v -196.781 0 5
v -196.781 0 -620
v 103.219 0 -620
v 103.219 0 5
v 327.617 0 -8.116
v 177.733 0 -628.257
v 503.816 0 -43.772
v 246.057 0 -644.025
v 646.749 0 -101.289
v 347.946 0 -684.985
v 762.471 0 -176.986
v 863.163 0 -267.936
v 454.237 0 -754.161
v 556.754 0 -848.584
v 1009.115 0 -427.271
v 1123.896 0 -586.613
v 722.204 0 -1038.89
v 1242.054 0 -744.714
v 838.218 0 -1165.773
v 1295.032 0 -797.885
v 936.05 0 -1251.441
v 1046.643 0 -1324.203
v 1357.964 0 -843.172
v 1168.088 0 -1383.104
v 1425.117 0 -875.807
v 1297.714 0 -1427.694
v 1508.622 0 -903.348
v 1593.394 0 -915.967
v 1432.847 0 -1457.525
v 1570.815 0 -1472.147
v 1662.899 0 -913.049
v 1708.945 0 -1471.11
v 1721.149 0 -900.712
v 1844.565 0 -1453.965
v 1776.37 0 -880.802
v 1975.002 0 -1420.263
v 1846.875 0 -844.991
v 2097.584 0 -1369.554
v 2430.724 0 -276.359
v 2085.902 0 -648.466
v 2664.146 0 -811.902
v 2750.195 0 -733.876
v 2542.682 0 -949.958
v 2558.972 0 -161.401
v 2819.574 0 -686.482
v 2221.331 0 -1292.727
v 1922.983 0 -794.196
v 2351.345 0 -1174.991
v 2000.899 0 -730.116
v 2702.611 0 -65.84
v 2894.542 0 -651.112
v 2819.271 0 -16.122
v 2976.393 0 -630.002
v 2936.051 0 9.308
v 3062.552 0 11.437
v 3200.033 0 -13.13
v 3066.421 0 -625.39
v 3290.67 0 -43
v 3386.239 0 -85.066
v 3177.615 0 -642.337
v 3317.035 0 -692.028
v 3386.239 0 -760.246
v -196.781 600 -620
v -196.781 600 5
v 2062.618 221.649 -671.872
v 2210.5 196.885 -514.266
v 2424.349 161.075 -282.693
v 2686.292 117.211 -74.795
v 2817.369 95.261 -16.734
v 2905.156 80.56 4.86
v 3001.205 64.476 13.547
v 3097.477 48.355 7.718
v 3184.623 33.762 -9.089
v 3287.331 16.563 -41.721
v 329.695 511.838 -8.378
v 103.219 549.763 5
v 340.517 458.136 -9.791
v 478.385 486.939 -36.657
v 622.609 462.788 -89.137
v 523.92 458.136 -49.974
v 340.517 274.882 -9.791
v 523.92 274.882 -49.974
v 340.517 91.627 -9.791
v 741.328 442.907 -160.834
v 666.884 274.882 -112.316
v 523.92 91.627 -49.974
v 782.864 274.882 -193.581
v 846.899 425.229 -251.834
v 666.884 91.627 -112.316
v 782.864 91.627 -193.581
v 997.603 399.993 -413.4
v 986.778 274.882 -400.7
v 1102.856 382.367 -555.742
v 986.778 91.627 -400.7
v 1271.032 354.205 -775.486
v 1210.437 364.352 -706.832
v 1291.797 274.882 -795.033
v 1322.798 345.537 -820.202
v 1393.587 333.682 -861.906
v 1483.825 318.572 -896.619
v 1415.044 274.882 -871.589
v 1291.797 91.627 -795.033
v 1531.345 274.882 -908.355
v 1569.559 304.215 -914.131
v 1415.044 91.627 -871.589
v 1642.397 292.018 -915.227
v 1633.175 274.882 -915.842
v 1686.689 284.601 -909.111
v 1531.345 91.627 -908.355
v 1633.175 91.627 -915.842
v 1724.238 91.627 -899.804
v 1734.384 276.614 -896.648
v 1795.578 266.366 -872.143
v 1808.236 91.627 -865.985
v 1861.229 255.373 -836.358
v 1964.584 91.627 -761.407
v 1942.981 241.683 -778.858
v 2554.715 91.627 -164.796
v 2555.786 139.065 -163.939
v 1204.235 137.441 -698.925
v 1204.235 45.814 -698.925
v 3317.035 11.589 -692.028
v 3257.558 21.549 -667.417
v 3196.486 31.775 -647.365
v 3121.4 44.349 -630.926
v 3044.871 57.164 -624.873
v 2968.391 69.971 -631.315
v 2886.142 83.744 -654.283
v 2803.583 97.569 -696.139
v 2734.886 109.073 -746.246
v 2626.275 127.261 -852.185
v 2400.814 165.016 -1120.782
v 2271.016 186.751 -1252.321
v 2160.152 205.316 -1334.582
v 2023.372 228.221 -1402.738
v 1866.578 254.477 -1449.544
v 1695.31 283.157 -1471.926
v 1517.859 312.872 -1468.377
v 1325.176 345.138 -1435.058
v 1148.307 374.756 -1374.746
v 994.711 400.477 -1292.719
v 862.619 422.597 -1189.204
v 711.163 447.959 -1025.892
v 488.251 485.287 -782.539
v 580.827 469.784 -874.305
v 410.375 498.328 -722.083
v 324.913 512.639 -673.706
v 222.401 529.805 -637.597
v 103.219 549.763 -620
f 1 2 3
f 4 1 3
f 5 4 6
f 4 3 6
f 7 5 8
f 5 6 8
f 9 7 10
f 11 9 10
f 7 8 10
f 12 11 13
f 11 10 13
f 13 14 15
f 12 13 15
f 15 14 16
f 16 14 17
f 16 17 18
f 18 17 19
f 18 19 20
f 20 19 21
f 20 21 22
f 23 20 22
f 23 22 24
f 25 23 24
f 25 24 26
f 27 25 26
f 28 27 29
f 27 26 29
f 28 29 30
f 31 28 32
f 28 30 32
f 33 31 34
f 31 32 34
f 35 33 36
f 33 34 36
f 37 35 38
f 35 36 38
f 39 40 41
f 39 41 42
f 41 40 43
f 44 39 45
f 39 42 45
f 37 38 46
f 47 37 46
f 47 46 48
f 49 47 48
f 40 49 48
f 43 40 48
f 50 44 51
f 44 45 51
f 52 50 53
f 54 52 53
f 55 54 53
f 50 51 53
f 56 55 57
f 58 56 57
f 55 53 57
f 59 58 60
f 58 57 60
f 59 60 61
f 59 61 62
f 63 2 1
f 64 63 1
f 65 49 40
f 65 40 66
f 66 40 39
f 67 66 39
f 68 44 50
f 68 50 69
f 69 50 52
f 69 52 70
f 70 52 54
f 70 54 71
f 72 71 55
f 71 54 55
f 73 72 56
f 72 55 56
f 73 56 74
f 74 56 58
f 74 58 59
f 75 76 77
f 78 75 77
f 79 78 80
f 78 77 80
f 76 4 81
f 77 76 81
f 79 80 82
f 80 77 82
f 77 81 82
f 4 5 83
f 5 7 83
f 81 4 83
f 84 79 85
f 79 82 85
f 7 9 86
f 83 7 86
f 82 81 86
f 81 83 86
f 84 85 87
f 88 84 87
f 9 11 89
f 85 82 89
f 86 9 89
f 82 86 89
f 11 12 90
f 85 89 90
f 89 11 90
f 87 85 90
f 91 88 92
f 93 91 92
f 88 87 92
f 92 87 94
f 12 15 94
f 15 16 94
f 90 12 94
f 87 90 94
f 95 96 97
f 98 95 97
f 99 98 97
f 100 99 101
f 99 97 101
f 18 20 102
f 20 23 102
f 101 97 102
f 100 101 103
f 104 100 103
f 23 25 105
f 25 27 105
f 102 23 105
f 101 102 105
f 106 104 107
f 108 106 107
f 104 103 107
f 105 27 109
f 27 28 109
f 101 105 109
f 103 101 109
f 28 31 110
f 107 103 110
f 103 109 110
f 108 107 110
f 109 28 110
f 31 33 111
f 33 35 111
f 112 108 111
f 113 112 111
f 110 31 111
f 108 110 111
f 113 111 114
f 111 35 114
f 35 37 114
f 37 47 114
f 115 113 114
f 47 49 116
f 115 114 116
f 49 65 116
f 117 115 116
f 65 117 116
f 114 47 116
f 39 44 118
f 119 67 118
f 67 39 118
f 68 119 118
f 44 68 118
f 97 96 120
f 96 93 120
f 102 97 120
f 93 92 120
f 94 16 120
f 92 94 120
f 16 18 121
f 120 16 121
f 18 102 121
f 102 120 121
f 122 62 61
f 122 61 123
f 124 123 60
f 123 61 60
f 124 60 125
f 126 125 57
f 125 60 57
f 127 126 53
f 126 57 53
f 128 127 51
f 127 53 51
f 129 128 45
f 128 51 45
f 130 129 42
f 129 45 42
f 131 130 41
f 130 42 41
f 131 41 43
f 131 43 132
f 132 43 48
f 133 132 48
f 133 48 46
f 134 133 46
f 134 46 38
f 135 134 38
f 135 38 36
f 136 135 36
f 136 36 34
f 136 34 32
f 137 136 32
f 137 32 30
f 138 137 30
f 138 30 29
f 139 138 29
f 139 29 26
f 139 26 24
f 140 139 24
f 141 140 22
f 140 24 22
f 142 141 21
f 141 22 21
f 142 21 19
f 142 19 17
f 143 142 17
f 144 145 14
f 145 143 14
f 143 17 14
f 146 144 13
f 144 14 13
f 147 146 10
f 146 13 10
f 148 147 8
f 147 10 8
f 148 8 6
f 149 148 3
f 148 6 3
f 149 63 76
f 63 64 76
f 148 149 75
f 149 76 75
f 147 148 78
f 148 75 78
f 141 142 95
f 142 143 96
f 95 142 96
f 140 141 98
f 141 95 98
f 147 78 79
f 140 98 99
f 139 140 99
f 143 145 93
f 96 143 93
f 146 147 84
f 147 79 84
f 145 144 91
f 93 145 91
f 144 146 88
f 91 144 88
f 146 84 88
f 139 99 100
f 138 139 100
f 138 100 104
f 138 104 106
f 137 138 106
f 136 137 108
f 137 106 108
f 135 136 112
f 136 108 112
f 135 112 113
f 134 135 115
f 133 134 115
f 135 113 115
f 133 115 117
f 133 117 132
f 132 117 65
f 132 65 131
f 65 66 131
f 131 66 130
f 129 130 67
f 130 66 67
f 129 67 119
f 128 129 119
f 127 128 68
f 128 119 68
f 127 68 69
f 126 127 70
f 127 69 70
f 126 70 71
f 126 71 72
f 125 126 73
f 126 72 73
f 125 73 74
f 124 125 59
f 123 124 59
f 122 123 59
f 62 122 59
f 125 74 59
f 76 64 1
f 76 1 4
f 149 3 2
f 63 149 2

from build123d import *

# Parameters (mm, degrees)
BOSS_EXTRUDE1_DEPTH     = 600
CUT_EXTRUDE1_DEPTH      = 1980
CUT_EXTRUDE1_DEPTH_BACK = 1980


with BuildPart() as part:
    # Sketch3 → Boss-Extrude1 (new body)
    with BuildSketch(Plane(origin=(0, 0, 0), x_dir=(1, 0, 0), z_dir=(0, 1, 0))):
        with BuildLine():
            Line((103.218681112, 620), (-196.781318888, 620))
            Line((-196.781318888, 620), (-196.781318888, -5))
            Line((-196.781318888, -5), (103.218681112, -5))
            add(Edge.make_bspline(
                [(103.218681112, -5), (588.195154083, -3.163876673), (771.964594842, 163.799162942), (1094.072701401, 516.961291923), (1231.556596444, 783.162980701), (1553.46181428, 941.694369248), (2236.258983329, 839.954455387), (2563.06483301, -321.158582751), (3386.238883814, 85.06610873)],
                knots=[0, 0, 0, 0, 0.169189831, 0.199378197, 0.290494168, 0.314771929, 0.430766308, 1, 1, 1, 1], degree=3))
            Line((3386.238883814, 85.06610873), (3386.238883814, 760.246183749))
            add(Edge.make_bspline(
                [(3386.238883814, 760.246183749), (3317.035378353, 692.028174156)],
                knots=[0, 0, 1, 1], degree=1))
            add(Edge.make_bspline(
                [(3317.035378353, 692.028174156), (2719.285403286, 421.343297775), (2458.958585868, 1613.401027739), (791.345221602, 1472.71065196), (517.504039845, 642.649574707), (103.218681112, 620)],
                knots=[0, 0, 0, 0, 0.371433836, 0.717359921, 1, 1, 1, 1], degree=3))
        make_face()
    extrude(amount=BOSS_EXTRUDE1_DEPTH)

    # Sketch4 → Cut-Extrude1 (cut, two sides)
    with BuildSketch(Plane.XY) as cut_extrude1_sk:
        Polygon((-196.781318888, 600), (3386.238883814, 0), (3386.238883814, 600), align=None)
    extrude(amount=CUT_EXTRUDE1_DEPTH, mode=Mode.SUBTRACT)
    extrude(cut_extrude1_sk.sketch, amount=-CUT_EXTRUDE1_DEPTH_BACK, mode=Mode.SUBTRACT)


solid = part.part
